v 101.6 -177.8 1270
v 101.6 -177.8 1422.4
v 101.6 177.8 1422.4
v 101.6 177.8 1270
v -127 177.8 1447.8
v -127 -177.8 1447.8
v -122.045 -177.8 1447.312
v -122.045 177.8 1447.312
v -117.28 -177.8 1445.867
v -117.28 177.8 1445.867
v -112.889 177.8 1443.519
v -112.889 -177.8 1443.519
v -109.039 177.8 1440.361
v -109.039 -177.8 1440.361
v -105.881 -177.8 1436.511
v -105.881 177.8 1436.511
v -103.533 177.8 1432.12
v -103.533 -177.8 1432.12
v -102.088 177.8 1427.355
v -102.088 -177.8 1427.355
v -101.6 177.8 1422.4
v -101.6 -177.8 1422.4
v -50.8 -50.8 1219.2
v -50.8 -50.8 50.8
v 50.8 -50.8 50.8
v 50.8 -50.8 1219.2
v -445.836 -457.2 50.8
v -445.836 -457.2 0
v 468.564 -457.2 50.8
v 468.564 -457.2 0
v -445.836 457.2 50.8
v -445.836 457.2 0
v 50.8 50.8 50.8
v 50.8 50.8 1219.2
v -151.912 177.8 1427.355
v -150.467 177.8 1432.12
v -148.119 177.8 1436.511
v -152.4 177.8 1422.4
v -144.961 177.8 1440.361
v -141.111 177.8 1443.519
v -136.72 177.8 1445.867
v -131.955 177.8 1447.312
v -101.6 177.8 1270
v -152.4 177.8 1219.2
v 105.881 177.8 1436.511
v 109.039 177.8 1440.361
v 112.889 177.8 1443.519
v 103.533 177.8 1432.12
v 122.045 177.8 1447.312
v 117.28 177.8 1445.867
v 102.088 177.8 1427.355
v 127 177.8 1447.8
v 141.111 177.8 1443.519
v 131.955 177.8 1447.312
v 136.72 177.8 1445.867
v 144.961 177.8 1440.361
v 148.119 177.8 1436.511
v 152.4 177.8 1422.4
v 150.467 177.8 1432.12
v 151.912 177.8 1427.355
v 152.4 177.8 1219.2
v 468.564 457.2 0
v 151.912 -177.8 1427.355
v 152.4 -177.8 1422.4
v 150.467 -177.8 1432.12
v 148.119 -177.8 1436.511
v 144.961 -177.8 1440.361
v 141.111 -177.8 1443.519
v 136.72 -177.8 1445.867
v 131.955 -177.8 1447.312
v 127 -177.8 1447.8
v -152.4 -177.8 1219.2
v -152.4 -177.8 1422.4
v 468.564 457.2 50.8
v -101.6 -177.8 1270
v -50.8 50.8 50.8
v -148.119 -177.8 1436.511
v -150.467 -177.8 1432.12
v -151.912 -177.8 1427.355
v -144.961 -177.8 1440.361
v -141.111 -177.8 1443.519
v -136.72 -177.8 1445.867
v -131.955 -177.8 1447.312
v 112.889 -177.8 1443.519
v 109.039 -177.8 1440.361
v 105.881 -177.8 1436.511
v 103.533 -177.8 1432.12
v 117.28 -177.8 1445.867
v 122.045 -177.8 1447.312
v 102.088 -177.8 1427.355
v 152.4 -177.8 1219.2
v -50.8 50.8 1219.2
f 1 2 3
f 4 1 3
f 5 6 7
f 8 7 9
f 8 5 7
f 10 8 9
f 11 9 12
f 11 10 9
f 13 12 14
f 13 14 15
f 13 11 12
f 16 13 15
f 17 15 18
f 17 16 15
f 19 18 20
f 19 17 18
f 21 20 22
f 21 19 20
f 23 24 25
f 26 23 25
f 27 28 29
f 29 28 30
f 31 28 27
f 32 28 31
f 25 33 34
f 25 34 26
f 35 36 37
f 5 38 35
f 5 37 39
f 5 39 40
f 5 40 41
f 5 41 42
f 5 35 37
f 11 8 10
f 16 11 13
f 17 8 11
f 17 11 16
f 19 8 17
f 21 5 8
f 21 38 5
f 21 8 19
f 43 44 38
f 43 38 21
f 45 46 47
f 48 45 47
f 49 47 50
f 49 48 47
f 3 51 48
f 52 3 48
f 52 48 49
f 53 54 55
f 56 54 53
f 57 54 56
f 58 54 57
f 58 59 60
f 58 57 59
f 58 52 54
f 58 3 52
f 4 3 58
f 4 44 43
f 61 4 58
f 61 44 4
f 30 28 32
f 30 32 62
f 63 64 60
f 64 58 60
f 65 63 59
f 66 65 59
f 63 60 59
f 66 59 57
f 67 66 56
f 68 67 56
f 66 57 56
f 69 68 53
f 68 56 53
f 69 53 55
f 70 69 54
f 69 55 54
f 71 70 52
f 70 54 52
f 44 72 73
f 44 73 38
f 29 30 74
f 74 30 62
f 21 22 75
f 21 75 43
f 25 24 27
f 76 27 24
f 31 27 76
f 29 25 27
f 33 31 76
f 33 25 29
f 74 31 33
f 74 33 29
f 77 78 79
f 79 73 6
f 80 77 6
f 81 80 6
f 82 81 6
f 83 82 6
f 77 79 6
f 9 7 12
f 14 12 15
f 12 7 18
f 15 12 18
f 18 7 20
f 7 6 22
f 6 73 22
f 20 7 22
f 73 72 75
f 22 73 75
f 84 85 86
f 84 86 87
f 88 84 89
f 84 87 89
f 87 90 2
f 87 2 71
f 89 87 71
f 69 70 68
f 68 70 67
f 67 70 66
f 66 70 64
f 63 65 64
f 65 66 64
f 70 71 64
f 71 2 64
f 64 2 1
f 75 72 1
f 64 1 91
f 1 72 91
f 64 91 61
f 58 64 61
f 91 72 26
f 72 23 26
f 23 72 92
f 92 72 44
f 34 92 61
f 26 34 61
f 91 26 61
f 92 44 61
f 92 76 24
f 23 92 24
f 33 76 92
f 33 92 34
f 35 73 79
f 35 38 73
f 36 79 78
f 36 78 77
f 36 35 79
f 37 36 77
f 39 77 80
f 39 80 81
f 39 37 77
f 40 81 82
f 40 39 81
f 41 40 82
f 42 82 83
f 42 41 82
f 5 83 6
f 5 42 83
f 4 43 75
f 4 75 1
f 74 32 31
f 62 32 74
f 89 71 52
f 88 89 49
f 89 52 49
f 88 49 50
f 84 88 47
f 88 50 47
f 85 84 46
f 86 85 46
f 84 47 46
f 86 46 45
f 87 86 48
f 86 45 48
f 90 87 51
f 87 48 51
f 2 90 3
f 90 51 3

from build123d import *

# Parameters (mm, degrees)
F0_W     = 914.4
F0_H     = 914.4
F1_DEPTH = 50.8
F2_W     = 101.6
F2_H     = 101.6
F3_DEPTH = 1219.2
F4_W     = 304.8
F4_H     = 355.6
F5_DEPTH = 228.6
F6_W     = 203.2
F6_H     = 355.6
F7_DEPTH = 177.8
F8_R     = 25.39999


# Not quite as in the source:
# - a fillet or chamfer is up to 0.001 mm smaller than in the source, because OpenCascade refuses the exact size
# - a feature names something its author has since deleted; it is built from what else it names


with BuildPart() as f1:
    # F0 (on Top) → F1 (new body)
    with BuildSketch(Plane.XY):
        with Locations((11.3640455229, 0)):
            Rectangle(F0_W, F0_H)
    extrude(amount=F1_DEPTH)

    # F2 (on face) → F3 (join)
    with BuildSketch(Plane(origin=(0, 0, 0), x_dir=(1, 0, 0), z_dir=(0, 0, -1))):
        Rectangle(F2_W, F2_H)
    extrude(amount=-F3_DEPTH)

    # F4 (on face) → F5 (join)
    with BuildSketch(Plane.XY.offset(1219.2)):
        Rectangle(F4_W, F4_H)
    extrude(amount=F5_DEPTH)

    # F6 (on face) → F7 (cut)
    with BuildSketch(Plane.XY.offset(1447.8)):
        Rectangle(F6_W, F6_H)
    extrude(amount=-F7_DEPTH, mode=Mode.SUBTRACT)

    # F8 (radius 25.4 in the source; OpenCascade refuses exactly that, so slightly less here)
    f8_edges = [f1.edges().sort_by_distance(p)[0] for p in [
        (-152.4, 0, 1447.8),
        (-101.6, 0, 1447.8),
        (101.6, 0, 1447.8),
        (152.4, 0, 1447.8),
    ]]
    fillet(f8_edges, radius=F8_R)


solid = f1.part
